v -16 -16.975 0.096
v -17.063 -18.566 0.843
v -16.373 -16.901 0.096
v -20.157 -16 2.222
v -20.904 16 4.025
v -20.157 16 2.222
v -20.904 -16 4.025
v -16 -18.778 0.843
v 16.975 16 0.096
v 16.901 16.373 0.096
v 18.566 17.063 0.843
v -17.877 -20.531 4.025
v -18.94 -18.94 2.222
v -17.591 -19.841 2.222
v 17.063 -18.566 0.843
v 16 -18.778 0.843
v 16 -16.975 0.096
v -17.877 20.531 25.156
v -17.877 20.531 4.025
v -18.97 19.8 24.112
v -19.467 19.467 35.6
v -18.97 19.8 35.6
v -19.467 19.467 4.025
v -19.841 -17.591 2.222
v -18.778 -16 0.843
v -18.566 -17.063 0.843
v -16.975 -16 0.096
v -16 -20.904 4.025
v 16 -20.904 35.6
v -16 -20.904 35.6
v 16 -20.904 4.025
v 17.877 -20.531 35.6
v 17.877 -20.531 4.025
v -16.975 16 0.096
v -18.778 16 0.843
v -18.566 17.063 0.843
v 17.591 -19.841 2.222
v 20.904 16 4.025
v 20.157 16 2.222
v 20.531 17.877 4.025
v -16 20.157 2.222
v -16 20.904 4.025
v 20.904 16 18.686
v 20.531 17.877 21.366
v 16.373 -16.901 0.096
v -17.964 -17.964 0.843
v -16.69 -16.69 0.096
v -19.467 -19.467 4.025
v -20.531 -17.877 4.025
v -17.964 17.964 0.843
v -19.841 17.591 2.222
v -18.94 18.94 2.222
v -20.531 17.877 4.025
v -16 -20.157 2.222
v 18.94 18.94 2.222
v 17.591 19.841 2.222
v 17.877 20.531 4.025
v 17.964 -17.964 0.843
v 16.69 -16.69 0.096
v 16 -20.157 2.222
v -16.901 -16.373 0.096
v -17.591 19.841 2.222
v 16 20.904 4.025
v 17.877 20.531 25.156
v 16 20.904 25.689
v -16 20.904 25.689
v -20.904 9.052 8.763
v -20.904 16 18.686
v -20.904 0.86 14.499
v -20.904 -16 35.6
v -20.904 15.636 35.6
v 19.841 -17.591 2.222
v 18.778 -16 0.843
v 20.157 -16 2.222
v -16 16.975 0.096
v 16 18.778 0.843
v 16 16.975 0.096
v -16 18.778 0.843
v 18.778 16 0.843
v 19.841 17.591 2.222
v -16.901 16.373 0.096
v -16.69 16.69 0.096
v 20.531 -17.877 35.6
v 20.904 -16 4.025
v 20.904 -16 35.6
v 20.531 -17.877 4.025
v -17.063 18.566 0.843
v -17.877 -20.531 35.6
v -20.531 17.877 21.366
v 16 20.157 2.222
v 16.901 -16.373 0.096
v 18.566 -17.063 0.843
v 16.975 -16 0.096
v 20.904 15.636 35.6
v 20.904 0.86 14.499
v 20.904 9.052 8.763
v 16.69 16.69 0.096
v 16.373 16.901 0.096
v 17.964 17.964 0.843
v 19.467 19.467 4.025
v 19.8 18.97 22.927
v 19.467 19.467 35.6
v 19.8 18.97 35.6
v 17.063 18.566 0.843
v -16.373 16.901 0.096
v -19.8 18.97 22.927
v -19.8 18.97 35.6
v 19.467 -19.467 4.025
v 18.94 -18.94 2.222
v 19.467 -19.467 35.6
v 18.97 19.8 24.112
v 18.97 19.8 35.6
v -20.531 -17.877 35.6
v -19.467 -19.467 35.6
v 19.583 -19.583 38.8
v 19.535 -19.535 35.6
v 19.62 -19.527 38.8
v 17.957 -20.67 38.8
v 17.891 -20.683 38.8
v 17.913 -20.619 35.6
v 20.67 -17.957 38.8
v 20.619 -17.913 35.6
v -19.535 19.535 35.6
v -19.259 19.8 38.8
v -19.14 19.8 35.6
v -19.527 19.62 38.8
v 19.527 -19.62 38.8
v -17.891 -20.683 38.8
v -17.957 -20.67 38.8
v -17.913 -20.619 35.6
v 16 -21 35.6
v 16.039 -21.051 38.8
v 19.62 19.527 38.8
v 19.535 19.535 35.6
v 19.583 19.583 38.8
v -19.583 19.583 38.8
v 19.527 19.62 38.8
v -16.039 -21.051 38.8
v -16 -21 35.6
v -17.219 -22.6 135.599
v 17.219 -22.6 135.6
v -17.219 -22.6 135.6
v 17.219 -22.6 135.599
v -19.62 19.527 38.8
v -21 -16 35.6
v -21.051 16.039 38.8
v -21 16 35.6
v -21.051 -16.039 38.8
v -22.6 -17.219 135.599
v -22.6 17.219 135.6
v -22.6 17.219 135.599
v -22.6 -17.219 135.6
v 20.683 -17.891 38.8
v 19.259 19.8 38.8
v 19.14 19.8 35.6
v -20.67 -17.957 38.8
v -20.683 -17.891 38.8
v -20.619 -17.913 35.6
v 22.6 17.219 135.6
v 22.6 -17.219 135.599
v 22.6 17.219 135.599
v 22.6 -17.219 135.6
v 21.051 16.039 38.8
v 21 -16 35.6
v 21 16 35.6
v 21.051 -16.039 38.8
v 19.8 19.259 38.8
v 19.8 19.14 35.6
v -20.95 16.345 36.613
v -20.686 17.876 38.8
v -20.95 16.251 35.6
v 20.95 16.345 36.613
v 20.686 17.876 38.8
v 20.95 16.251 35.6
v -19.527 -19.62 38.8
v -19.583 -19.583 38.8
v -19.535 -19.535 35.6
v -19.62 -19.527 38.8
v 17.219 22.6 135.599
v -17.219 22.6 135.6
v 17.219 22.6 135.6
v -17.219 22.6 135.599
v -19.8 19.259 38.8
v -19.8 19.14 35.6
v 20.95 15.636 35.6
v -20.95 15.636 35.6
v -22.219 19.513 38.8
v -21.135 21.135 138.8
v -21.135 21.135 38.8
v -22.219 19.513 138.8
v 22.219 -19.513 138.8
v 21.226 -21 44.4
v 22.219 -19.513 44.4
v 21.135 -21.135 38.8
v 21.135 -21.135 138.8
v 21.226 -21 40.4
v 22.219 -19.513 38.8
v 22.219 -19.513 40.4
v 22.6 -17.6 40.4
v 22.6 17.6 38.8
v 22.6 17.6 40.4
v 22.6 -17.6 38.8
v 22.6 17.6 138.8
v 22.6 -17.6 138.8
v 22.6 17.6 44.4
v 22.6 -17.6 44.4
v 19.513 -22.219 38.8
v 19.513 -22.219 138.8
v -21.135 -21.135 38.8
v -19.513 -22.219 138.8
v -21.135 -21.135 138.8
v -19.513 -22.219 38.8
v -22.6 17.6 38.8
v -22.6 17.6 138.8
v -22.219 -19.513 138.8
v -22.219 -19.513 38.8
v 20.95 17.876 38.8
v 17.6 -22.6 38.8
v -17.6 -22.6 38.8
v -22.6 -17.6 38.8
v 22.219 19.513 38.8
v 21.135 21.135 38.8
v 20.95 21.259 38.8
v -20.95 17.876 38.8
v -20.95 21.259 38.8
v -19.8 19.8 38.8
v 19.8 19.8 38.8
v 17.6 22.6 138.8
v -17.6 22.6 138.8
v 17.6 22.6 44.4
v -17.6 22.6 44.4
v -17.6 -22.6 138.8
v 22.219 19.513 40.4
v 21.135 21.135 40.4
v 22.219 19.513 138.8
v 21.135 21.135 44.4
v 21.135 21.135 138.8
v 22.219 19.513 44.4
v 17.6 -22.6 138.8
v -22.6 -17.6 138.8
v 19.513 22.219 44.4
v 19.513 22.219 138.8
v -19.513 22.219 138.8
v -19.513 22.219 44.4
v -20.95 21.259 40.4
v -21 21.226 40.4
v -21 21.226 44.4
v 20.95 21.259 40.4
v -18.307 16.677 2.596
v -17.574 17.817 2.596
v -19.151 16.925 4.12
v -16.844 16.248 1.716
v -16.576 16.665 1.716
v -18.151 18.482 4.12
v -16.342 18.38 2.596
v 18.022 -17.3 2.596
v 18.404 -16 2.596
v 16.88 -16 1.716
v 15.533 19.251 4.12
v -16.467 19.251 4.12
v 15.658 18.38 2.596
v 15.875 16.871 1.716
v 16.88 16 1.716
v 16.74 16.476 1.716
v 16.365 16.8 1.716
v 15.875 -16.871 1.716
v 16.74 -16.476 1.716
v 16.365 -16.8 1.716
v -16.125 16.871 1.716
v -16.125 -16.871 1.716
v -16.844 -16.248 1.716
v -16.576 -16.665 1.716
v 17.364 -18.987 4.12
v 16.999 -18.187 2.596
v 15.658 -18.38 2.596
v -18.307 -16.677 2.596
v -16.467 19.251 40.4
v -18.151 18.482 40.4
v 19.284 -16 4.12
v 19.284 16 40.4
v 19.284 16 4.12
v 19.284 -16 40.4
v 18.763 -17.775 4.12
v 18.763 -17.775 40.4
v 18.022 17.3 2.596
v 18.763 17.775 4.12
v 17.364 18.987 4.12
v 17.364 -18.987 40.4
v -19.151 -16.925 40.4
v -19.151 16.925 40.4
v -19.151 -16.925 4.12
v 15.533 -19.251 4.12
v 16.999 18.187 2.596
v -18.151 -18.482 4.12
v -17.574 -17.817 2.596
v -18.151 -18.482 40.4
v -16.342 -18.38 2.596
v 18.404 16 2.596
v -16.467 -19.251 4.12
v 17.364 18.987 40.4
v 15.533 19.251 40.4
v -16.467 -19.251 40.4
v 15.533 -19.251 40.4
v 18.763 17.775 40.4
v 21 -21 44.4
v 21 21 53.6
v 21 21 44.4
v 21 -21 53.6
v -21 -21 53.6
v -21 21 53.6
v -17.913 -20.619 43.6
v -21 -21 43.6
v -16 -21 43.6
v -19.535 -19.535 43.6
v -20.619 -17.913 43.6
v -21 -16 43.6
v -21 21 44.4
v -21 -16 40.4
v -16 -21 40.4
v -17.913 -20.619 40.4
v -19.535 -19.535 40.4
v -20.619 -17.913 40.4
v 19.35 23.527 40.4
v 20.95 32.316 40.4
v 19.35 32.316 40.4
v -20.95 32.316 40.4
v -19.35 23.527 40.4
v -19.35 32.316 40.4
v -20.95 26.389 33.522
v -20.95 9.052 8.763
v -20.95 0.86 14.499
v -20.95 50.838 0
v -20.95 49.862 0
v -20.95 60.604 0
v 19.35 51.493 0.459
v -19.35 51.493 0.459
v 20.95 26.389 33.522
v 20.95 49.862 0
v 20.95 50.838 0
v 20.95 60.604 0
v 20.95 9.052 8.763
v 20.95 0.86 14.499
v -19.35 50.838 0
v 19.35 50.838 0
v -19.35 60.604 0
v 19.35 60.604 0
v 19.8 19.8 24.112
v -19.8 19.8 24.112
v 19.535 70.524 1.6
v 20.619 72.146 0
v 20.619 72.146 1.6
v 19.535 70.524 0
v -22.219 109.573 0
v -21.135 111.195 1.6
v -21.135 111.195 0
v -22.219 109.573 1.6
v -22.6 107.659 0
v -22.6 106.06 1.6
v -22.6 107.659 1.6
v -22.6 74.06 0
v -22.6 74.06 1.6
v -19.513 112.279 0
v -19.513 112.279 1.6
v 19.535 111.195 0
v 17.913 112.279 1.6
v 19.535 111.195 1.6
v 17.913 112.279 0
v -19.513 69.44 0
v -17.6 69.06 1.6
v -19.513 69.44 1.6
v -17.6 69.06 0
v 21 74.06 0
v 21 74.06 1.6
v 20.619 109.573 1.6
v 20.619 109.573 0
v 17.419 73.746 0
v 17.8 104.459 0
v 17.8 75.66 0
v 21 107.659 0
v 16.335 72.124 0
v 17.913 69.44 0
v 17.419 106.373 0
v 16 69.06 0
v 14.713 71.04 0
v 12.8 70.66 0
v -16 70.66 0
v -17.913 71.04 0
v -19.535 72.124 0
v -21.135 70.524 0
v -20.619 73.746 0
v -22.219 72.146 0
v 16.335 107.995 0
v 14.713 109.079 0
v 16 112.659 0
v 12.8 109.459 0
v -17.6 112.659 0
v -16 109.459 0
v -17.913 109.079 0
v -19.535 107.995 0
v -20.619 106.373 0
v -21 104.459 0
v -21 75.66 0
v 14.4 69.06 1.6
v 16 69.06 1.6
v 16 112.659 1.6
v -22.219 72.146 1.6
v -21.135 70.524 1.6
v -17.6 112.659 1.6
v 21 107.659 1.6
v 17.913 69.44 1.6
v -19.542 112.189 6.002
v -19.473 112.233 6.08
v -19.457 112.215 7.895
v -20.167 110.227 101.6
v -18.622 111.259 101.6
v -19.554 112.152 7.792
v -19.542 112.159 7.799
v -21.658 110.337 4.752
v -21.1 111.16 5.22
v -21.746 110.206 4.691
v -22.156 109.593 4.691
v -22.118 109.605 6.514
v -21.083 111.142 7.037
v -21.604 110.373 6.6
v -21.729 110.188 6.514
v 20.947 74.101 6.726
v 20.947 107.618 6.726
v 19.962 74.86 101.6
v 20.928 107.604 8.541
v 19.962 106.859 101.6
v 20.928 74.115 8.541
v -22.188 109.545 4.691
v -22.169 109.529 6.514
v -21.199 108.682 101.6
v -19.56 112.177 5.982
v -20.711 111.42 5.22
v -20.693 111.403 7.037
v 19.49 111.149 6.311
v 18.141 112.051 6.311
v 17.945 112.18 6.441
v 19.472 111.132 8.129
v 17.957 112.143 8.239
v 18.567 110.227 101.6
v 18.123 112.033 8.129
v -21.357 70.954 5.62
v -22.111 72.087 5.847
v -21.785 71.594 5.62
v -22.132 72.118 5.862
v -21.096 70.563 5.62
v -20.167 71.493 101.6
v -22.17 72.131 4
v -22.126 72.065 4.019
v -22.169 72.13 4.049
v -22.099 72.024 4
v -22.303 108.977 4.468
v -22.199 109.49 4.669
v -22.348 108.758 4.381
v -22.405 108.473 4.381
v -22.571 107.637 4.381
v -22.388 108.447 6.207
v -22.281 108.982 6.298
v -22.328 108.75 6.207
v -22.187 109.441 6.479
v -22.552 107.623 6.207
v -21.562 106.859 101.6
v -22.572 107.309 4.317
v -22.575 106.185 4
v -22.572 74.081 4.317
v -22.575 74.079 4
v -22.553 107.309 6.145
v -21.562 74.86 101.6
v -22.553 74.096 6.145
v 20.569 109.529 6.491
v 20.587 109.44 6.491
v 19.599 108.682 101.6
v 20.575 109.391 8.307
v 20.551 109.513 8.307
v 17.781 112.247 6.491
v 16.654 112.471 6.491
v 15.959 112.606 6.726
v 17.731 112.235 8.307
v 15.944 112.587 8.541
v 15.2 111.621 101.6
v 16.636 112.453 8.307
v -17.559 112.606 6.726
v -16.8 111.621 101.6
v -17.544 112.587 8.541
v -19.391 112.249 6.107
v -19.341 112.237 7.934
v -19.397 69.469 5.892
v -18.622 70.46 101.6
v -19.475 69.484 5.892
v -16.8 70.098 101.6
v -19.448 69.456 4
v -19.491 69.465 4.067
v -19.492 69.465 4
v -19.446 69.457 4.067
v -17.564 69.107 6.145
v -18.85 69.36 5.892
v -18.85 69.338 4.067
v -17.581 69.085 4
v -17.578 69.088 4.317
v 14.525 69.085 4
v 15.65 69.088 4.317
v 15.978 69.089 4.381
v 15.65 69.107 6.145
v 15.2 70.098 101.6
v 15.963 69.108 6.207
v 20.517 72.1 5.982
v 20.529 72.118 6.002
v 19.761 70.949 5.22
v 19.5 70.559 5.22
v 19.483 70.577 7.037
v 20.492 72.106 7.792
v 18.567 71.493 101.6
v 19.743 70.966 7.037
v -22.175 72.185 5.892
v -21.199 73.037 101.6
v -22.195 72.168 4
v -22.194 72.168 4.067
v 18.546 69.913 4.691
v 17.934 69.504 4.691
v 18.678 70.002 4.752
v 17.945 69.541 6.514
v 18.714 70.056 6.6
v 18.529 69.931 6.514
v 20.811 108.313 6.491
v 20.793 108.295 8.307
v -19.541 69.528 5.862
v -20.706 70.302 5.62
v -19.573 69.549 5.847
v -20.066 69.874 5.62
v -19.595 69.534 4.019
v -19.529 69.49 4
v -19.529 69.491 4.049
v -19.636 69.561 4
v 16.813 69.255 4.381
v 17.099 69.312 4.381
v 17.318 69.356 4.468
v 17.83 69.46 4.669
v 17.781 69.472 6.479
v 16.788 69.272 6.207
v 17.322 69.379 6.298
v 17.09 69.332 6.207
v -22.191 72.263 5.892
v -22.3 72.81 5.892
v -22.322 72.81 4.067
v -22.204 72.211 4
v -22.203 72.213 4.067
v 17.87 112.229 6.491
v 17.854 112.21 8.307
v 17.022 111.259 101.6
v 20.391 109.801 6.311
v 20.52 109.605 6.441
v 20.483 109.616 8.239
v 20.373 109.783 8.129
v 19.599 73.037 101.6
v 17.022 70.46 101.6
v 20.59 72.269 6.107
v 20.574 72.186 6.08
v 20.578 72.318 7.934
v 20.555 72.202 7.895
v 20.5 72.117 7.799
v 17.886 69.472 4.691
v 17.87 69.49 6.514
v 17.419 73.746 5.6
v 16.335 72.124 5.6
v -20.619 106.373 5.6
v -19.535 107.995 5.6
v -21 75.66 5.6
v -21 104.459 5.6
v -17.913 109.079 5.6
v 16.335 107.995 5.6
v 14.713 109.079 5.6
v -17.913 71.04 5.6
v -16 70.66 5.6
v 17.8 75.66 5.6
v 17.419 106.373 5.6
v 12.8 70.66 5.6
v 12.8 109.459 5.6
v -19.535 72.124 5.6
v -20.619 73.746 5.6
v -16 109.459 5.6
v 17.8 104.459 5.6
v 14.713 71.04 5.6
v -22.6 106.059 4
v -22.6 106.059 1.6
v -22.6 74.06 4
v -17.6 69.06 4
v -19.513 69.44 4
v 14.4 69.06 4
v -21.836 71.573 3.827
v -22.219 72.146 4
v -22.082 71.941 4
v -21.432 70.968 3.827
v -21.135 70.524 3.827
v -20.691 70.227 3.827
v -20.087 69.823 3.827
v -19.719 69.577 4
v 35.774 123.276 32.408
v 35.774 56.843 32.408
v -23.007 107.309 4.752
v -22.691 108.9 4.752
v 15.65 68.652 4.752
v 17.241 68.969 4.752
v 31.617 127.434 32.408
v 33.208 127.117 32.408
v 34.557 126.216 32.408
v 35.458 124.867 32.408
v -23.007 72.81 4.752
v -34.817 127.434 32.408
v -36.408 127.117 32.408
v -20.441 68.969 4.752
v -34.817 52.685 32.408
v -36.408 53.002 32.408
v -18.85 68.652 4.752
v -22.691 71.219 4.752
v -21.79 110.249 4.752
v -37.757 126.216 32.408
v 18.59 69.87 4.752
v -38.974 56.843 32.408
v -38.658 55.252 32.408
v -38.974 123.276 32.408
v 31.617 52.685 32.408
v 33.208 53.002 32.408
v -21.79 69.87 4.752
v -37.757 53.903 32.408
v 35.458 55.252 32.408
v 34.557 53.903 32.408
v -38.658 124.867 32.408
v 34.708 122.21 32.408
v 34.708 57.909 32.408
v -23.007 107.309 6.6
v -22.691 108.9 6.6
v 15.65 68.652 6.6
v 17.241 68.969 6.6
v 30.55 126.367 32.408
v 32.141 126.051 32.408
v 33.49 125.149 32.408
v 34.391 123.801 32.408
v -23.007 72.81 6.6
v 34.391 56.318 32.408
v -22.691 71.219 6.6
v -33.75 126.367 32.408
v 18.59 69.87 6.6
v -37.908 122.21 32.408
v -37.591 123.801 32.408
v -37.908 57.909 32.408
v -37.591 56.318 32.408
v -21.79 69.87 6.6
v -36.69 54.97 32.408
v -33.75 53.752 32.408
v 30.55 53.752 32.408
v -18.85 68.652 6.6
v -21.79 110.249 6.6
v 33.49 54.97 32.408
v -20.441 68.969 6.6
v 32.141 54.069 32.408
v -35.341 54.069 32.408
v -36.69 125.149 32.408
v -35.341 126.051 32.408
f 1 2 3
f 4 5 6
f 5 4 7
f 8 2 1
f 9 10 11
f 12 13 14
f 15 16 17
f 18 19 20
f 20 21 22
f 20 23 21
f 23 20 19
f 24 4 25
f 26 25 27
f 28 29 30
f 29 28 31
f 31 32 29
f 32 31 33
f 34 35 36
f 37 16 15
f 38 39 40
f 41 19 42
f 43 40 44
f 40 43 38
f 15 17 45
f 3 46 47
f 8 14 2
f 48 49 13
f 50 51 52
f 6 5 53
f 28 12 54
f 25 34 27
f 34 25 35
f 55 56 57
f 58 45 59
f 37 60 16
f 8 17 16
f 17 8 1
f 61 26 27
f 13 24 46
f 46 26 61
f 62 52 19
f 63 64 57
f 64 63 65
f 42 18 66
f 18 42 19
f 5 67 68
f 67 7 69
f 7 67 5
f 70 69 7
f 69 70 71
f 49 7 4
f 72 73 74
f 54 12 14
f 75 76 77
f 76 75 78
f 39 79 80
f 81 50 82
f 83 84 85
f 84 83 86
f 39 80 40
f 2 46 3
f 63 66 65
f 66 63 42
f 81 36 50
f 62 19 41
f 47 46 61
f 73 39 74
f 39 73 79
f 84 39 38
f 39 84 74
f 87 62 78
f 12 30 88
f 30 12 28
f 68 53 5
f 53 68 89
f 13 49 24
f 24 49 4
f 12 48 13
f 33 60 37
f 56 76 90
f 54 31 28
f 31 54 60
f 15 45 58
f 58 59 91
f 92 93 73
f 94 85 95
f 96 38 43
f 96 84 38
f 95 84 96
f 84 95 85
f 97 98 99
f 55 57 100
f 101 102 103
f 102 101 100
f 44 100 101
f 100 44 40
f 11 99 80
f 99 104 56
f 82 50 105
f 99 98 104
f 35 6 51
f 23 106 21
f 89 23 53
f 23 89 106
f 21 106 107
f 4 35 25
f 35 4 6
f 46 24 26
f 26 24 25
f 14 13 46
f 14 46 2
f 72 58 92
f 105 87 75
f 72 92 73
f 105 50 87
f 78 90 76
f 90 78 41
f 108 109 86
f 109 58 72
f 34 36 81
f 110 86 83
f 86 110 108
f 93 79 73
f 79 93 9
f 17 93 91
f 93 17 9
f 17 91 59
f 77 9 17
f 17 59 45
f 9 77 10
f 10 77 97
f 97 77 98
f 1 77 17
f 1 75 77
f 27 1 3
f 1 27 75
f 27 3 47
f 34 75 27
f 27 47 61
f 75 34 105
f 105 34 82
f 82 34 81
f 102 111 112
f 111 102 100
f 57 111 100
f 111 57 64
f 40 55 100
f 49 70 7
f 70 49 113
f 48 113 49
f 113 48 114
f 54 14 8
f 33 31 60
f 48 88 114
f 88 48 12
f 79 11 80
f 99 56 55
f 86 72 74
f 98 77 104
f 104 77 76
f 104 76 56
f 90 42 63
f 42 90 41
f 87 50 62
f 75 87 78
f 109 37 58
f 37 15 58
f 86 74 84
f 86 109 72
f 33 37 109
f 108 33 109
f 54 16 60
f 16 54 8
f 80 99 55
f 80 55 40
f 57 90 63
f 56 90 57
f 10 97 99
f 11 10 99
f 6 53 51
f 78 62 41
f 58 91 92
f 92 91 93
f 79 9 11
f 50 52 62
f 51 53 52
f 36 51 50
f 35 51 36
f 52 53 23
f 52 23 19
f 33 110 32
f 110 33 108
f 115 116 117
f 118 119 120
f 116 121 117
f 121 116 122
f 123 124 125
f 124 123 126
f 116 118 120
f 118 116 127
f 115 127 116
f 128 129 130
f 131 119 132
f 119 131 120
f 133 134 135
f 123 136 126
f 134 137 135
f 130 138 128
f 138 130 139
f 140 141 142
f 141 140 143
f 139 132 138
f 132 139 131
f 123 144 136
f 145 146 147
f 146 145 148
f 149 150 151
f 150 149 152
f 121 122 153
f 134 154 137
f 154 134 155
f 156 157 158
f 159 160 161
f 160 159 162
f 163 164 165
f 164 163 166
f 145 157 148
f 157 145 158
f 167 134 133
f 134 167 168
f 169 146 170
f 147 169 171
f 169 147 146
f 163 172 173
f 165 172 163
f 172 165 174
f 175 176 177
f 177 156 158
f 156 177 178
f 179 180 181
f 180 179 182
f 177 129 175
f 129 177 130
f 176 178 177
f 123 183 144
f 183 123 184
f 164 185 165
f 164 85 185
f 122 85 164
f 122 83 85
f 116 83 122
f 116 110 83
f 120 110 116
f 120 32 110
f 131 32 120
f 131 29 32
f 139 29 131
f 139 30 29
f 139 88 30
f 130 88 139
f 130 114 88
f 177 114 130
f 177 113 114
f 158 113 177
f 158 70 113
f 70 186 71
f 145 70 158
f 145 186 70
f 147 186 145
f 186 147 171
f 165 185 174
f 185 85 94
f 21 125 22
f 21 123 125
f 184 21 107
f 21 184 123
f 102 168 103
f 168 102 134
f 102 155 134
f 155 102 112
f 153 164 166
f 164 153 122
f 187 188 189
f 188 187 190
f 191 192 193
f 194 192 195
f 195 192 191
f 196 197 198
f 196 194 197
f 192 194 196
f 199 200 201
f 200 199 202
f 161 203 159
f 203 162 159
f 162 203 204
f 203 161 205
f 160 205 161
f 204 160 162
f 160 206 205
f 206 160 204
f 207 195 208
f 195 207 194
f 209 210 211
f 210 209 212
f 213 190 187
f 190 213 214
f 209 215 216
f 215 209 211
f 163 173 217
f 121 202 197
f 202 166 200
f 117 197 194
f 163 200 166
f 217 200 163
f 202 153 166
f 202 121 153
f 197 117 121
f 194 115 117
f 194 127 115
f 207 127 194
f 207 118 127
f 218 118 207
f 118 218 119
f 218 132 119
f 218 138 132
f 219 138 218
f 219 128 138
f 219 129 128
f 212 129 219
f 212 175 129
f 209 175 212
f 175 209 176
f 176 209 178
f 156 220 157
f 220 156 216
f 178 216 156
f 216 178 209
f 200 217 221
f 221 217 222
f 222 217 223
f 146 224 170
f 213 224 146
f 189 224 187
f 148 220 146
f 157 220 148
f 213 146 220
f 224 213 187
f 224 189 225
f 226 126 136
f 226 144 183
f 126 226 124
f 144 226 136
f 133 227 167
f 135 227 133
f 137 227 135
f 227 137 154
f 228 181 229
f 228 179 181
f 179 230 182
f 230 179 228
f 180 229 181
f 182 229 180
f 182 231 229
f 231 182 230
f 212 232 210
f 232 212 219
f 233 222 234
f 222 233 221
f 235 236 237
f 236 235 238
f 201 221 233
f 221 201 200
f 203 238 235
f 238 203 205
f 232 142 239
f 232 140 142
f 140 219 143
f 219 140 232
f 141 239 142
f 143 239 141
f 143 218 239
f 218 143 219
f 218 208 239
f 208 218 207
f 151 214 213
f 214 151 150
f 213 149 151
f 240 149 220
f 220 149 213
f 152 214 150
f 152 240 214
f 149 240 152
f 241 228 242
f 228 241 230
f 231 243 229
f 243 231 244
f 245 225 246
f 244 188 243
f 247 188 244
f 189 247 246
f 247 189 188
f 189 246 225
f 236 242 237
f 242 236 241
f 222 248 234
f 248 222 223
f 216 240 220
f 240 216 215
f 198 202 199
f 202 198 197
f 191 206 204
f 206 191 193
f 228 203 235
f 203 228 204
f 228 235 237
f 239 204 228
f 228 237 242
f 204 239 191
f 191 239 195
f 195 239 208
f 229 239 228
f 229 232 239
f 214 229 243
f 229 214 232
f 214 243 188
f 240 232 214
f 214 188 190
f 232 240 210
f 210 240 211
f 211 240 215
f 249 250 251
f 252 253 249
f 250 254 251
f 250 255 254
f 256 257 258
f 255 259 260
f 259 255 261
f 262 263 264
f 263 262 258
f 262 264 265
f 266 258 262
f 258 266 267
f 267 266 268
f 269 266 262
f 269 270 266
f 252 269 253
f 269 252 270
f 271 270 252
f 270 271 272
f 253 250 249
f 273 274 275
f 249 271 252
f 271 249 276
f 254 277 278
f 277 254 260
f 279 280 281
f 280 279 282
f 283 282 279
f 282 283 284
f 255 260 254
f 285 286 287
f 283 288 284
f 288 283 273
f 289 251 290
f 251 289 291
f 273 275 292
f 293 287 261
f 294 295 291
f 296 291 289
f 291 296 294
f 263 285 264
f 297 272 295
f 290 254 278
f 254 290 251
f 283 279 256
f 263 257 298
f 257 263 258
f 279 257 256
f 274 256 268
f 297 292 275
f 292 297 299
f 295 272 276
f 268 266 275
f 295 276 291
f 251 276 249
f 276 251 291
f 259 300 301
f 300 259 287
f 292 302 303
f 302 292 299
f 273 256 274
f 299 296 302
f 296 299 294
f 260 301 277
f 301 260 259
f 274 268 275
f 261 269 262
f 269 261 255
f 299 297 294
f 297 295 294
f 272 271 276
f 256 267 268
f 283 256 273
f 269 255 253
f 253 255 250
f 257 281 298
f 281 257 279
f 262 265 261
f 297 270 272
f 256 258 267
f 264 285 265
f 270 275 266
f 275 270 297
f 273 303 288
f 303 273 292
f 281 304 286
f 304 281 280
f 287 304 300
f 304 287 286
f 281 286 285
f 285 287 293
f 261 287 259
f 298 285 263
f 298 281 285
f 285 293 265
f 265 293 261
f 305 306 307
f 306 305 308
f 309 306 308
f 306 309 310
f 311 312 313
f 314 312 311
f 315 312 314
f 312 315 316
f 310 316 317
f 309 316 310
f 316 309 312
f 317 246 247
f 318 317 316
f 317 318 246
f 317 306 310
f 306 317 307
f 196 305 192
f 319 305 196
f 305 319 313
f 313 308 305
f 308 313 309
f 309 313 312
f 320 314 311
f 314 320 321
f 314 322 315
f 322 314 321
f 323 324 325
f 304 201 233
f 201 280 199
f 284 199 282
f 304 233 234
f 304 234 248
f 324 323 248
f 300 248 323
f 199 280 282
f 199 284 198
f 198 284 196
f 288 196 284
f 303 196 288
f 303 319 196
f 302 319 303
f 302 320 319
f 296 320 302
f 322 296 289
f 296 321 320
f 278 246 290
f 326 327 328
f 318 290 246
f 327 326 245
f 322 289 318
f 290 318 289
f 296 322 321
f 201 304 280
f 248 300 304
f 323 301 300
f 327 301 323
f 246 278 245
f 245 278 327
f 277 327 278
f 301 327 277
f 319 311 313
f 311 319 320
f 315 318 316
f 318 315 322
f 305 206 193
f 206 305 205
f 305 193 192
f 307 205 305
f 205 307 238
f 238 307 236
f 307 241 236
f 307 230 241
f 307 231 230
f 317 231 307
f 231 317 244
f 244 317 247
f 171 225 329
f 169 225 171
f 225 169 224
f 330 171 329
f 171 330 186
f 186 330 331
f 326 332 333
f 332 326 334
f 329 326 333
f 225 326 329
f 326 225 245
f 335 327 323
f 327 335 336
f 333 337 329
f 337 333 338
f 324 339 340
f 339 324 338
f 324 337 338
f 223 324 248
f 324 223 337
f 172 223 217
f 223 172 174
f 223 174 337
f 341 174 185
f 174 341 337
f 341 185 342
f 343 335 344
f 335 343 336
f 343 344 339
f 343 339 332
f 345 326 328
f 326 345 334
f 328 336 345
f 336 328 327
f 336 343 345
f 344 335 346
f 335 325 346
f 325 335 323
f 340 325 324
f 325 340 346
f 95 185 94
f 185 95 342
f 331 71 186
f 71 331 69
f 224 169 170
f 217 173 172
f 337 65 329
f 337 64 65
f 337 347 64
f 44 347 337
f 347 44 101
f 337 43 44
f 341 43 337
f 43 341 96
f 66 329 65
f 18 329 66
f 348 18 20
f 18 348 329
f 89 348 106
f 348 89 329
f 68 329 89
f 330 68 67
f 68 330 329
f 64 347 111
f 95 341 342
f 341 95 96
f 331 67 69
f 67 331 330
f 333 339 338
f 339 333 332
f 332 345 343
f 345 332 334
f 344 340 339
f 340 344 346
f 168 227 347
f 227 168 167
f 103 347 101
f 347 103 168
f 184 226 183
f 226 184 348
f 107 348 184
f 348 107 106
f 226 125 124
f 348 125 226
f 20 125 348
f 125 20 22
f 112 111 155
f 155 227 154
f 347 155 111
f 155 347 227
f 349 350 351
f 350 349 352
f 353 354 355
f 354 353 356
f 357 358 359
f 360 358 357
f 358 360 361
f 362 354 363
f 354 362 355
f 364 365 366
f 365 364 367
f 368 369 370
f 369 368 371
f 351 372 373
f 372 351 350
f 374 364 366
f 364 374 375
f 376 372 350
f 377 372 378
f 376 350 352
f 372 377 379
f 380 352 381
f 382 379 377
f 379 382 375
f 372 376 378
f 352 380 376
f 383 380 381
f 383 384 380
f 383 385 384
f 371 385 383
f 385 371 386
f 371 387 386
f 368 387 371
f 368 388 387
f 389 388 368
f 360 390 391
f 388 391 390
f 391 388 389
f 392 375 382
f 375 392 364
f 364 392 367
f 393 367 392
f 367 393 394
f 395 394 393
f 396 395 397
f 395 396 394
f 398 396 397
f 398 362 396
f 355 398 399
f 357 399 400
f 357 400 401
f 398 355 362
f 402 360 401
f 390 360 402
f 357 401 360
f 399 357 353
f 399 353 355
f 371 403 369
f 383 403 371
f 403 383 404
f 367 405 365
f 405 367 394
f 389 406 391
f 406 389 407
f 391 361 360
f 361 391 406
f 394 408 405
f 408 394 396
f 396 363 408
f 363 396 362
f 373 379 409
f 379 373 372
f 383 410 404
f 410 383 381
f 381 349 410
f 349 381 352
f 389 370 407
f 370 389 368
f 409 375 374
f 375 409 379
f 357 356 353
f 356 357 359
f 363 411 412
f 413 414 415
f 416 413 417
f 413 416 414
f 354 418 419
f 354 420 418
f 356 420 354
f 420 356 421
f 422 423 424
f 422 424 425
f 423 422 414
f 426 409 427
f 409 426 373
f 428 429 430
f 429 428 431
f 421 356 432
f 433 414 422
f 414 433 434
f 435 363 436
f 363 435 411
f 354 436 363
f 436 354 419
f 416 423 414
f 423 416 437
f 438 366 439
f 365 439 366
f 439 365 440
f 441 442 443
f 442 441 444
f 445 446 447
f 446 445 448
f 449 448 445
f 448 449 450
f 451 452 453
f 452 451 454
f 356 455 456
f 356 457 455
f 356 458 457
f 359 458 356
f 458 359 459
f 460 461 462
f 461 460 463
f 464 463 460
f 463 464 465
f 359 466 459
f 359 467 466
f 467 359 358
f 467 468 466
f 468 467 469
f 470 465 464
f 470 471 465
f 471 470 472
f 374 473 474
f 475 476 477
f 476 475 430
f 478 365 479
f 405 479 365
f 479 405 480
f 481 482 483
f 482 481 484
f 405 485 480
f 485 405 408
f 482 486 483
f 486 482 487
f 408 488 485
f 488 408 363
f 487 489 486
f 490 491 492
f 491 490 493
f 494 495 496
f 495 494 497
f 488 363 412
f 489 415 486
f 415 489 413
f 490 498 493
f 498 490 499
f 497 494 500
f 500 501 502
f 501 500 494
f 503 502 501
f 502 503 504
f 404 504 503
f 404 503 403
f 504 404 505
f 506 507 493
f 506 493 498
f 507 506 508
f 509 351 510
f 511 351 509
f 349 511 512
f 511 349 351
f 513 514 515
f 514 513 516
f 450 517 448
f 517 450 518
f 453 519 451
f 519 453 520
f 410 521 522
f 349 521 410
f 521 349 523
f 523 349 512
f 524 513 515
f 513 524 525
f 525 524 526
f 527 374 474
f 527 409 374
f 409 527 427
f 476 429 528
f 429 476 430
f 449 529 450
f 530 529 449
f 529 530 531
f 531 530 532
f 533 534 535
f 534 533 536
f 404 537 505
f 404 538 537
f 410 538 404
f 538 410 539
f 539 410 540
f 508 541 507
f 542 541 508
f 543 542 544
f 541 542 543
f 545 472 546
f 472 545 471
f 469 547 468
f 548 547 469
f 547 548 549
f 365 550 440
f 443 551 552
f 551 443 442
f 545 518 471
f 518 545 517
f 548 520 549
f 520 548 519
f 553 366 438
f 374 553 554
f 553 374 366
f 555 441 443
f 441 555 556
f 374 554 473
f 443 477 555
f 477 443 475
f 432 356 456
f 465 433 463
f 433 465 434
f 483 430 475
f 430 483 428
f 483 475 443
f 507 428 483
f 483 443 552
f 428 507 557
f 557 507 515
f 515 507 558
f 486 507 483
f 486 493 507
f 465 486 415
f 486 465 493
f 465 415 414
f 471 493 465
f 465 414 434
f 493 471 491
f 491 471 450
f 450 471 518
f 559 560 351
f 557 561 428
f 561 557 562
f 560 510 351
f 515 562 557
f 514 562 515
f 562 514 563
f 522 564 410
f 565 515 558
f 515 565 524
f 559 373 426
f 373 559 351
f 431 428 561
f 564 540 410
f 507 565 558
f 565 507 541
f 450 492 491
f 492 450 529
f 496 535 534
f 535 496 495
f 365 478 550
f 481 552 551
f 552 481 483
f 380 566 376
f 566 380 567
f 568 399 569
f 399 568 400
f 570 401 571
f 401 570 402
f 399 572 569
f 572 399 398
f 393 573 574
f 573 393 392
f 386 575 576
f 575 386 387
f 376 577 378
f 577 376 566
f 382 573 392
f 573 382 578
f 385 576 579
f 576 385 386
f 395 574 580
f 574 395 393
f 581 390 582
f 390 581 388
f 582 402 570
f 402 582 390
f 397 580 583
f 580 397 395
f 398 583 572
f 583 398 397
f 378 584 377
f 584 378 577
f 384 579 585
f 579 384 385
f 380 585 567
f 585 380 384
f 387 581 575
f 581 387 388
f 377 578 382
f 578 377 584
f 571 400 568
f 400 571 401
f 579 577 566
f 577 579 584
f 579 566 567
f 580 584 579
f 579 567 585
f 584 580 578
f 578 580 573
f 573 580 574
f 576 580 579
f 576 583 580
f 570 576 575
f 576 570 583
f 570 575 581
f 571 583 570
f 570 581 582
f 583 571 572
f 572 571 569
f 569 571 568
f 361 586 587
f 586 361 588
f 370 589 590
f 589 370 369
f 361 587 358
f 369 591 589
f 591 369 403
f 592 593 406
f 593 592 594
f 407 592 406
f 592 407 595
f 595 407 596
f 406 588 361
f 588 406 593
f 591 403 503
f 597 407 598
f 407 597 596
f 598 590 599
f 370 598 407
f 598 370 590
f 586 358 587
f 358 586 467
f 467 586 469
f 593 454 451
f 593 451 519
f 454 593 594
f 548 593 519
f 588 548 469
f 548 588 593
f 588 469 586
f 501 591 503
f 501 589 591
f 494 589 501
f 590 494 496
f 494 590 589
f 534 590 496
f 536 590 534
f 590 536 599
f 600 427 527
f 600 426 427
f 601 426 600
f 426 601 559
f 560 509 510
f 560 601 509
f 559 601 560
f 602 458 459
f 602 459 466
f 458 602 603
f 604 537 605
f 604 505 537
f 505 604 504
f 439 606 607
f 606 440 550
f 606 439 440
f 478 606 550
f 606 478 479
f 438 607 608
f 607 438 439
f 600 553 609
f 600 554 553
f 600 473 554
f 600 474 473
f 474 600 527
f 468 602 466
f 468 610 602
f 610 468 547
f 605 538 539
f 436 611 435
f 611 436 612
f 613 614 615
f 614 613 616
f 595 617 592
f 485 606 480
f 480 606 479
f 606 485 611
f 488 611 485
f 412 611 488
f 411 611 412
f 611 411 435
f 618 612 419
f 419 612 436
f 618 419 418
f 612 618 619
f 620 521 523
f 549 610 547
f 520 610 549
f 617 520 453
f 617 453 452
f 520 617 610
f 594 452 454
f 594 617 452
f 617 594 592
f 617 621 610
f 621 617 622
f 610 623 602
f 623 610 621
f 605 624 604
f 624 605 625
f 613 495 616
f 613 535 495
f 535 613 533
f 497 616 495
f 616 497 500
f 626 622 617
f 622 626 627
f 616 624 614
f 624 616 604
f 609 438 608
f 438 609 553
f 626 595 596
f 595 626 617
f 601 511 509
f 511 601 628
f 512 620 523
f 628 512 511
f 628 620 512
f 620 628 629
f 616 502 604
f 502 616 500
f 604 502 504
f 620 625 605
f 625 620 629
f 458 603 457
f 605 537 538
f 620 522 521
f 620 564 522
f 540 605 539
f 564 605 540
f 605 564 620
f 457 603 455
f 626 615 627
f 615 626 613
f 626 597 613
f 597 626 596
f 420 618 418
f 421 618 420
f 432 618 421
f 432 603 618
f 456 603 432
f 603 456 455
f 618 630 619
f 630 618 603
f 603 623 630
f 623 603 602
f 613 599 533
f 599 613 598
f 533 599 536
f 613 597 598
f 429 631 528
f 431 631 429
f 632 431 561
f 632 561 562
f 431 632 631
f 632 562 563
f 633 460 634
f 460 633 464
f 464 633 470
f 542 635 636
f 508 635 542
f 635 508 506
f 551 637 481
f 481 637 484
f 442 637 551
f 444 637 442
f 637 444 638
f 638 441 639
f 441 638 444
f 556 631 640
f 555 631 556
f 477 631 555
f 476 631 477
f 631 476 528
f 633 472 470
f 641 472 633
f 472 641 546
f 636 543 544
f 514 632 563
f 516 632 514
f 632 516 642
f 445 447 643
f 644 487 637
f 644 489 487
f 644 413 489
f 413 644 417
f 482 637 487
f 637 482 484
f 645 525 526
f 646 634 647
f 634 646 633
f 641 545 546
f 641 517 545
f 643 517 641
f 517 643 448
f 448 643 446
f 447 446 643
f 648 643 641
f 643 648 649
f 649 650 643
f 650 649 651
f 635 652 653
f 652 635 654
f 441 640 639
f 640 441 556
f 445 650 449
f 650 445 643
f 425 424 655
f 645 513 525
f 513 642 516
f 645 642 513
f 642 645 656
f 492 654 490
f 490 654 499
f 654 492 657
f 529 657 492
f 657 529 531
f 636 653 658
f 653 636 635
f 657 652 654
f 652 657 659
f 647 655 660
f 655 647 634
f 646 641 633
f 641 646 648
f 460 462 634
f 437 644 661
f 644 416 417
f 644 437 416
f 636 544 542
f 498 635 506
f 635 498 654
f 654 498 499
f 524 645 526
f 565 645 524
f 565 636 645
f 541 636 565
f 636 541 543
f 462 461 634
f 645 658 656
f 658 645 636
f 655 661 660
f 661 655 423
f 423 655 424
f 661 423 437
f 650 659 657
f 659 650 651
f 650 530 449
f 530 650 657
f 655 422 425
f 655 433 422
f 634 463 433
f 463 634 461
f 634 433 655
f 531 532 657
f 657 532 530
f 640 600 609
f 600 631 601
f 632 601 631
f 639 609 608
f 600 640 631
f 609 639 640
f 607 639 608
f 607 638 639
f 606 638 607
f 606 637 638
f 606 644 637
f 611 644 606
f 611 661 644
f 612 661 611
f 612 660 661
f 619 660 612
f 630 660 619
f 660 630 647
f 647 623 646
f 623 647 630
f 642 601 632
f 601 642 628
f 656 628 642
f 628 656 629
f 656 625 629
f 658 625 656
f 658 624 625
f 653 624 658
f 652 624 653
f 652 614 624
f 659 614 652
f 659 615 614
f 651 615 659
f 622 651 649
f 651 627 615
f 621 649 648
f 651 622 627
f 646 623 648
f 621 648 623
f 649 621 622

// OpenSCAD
// -*- mode: SCAD ; c-file-style: "ellemtel" ; coding: utf-8 -*-
//
// Tea portioner
//
// Copyright 2017 Roland Sieker <ospalh@gmail.com>
// Licence: CC-BY-SA 4.0
// Using material (or inspirations) by
// Soren_Furbo (https://www.thingiverse.com/thing:43899/)
//

// How many cubic centimetres (ml) for one portion
volume = 55;  // [3:0.1:250]

// Don't
use_american_customary_units = 0;  // [1:Yes please. What's a meter?, 0:Of course not! Use SI units.]

module end_customizer()
{
   // This is a dummy module so stop users messing with the values below.
}

// TODO: labels
// TODO 2: Braile labels
// label_style = 1; [0:No label, 1:Raised Text, 2:Colored Text, 3:Braile];


min_funnel_top_width = 66.66667;

// Define values for $fa and $fs (or $fn) to get smoother corners.
// N.B.: Rendering of the funnel gets quite slow for small $fs and $fa values.
// $fa = 5;
// $fs = 0.5;


// This avoids odd edges caused by rounding errors. Use a smaller value
// here when you switched to smoother above.
odd_offset = 0.1;


// Should be a multiple of your nozzle diameter
wall_thickness = 1.6; // [1.2, 1.5, 1.6, 1.8]



// pi is still wrong. Even if we use the area of a circle below. Use tau.
tau = 2 * PI;

// Curvature of sides (Sphere radius)
roundness = 5;
inner_radius = roundness-wall_thickness;

chute_angle = 55;  // Degrees
funnel_angle = 60;

v_cmm = volume * 1000;

// Crazy math to get the volume with the rounding right Basically we
// have V = l^3 - lost_volume, with lost volume = the fillets in the
// edges and corners, 1/2 (cube - sphere), and a bit, depending on l,
// (square rod - cylinder), with no l^2 term.  Transformed to 0 = l^3 +
// al + b, plugged into Wolfram Alpha, put in here.
a = -8*(4-tau/2)*inner_radius*inner_radius;
b = -v_cmm +
      ((4-tau/3) -12 * (4 - tau/2)) * inner_radius*inner_radius*inner_radius;
// echo(a);
// echo(b);
// The solution of x^3+ax+b=0, accordinrg to Wolfram alpha
cube_root_bit = pow(sqrt(3) * sqrt(4*a*a*a + 27*b*b) - 9*b, 1/3);
inner_box_dimension = cube_root_bit / (pow(2, 1/3) * pow(3, 2/3)) -
   pow(2/3, 1/3) * a / cube_root_bit;
// echo(inner_box_dimension);
// echo(pow(v_cmm,1/3));
// Quick tests showed reasonable values, so i'll keep this version
// until somebody spots an error.

// End crazy math.

some_distance = 1.95 * inner_box_dimension + 10 * wall_thickness;


if (use_american_customary_units)
{
   how_rude();
}
else
{
   measure();
   chute();

   translate([0,some_distance,0])
   {
      rotate(180)
      {
         funnel();
      }
   }
}

if (false)
{
   // Demo. Check that the funnel fits
   translate(
      [wall_thickness, wall_thickness, inner_box_dimension + wall_thickness])
   {
      rotate(180)
      {
         funnel();
      }
   }

}

module how_rude()
{
   linear_extrude(hight = 0.5) {
      text(text="Please visit", size=5);
      translate([0,-5,0])
      {
         text(text="metric4us.com", size=5);
      }
   }
}

// Length of the inner cube
icl_xy = inner_box_dimension - 2 * inner_radius;
// Measure shell dimension
icl_z = inner_box_dimension - inner_radius;
msd = inner_box_dimension + 2*wall_thickness;


module measure()
{
   // The precisely shaped box

   icl_z_plus =  icl_z + 2*wall_thickness;
   difference()
   {
      union()
      {
         translate([0,0,icl_z_plus/2+roundness])
         {
            difference()
            {
               union()
               {
                  minkowski()
                  {
                     // This is the outer shell
                     cube([icl_xy, icl_xy, icl_z_plus], center=true);
                     sphere(roundness);
                  }
                  // The thicker walls at the top
                  delta_x = (inner_box_dimension +4*wall_thickness)/
                     (inner_box_dimension + 2*wall_thickness);
                  translate([0,0,icl_z/2-4*wall_thickness])
                  {
                     linear_extrude(hight=2*wall_thickness,scale=delta_x)
                     {
                        offset(r=roundness)
                        {
                           square([icl_xy,icl_xy],center=true);
                        }
                     }
                  }
                  translate([0,0,icl_z/2-2*wall_thickness])
                  {
                     linear_extrude(hight=3*wall_thickness)
                     {
                        offset(r=roundness)
                        {
                           square([icl_xy+2*wall_thickness,icl_xy+2*wall_thickness],center=true);
                        }
                     }
                  }
               }
               minkowski()
               {
                  // This is the main hollow shell
                  cube([icl_xy, icl_xy, icl_z_plus], center=true);
                  sphere(inner_radius);
               }
               // Cut off the top. A big enough cube. important is the
               // lower face hight.
               translate([-msd/2,-msd/2,icl_z_plus/2])
               {
                  cube([msd,msd,2*roundness]);
               }
            }
         }
      } // The measuring cup, with thick walls
      // Cutting out space where to put on the funnel. (No rails, just
      // lay it on top.)
      xyl_extra = 5*wall_thickness;
      xyl = inner_box_dimension+2*wall_thickness-2*roundness;
      translate([xyl_extra/2, xyl_extra/2, wall_thickness+inner_box_dimension])
      {
         linear_extrude(2.5*wall_thickness)
         {
            offset(roundness)
            {
               square([xyl + xyl_extra, xyl + xyl_extra],center=true);
            }
         }
      }
   }


}

module chute()
{
   // The length were done by hand, rather than
   // calculated. looks good, is good enough.
   w = inner_box_dimension + 2*wall_thickness - odd_offset;
   h = inner_box_dimension + wall_thickness;
   l = h / sin(chute_angle);
   p = l * cos(chute_angle);
   o = w/2 + p/2 + wall_thickness;
   difference()
   {
      union()
      {
         rotate([0,0,180])
         {
            translate([0,-o, h/2])
            {
               rotate(a=[chute_angle, 0, 0])
               {
                  cube([w, l, wall_thickness], center=true);
                  translate([w/2-wall_thickness/2,0,2.5*wall_thickness])
                  {
                     cube([wall_thickness, 2*l, 5*wall_thickness], center=true);
                  }
                  translate([-w/2+wall_thickness/2,0,2.5*wall_thickness])
                  {
                     cube([wall_thickness, 2*l, 5*wall_thickness], center=true);
                  }
               }
            }
            // Better connection between chute and measure
            difference()
            {
               translate([0,-w/2,
                          inner_box_dimension - inner_radius + roundness])
               {
                  rotate(a=[-chute_angle, 0, 0])
                  {
                     translate([-w/2, -wall_thickness, -2 * roundness + 1 * wall_thickness])
                     {
                        cube([w, 0.85*h, 2 * roundness]);
                     }
                  }
               }
               translate([0,-o, h/2])
               {
                  rotate(a=[chute_angle, 0, 0])
                  {
                     translate([0, 3*wall_thickness, 5*wall_thickness])
                     {
                        cube([w-odd_offset, l, 10*wall_thickness], center=true);
                     }
                  }
               }
               // I wanted to round the connection off. Too much work
               // to position the cylinder to do it.
               // translate([0,0,0])
               // {
               //    rotate(a=[0,90,0])
               //    {
               //       translate([0,0,-w/2])
               //       {
               //          cylinder(r=inner_radius, h=w);
               //       }
               //    }
               // }
            }
         }
      }
      // Honking big boxes to cut off too large stuff
      translate([0,0,-10*inner_box_dimension])
      {
         cube(20*inner_box_dimension,center=true);
      }
      translate(
         [0,0,10*inner_box_dimension + inner_box_dimension -
          inner_radius +roundness])
      {
         cube(20*inner_box_dimension,center=true);
      }
      cube([inner_box_dimension+wall_thickness/2,inner_box_dimension+wall_thickness/2,3*inner_box_dimension],center=true);
   }
}

module funnel()
{
   // First the base
//   xo = inner_box_dimension+2*wall_thickness-2*roundness-2*slider_tolerance;
   xyo = inner_box_dimension+3*wall_thickness-2*roundness;

//   xm = inner_box_dimension                 -2*roundness-2*slider_tolerance;
   xym = inner_box_dimension+2*wall_thickness-2*roundness;

//   xi = inner_box_dimension-2*wall_thickness-2*roundness-2*slider_tolerance;
   xyi = inner_box_dimension+0*  wall_thickness-2*roundness;
   difference()
    {
       translate([0.5*wall_thickness, 0.5*wall_thickness, 0])
       {
          union()
          {
             linear_extrude(wall_thickness)
             {
                offset(roundness)
                {
                   square([xyo,xyo],center=true);
                }
             }
             // Half of this is hidden in the bit below. This covers some edges
             translate([0,0, wall_thickness])
             {

                linear_extrude(hight=1.5*wall_thickness, scale=xym/xyo)
                {
                   offset(roundness)
                   {
                      square([xyo,xyo],center=true);
                   }
                }
             }
          }
       }
       translate([wall_thickness, wall_thickness, -0.5*wall_thickness])
       {
          linear_extrude(4*wall_thickness)
          {
             offset(roundness)
             {
                square([xyi, xyi],center=true);
             }
          }
       }

    }

   difference()
    {
       translate([wall_thickness, wall_thickness, wall_thickness])
       {
          linear_extrude(1.5*wall_thickness)
          {
             offset(roundness)
             {
                square([xym, xym],center=true);
             }
          }
       }
       translate([wall_thickness, wall_thickness, -0.5*wall_thickness])
       {
          linear_extrude(4*wall_thickness)
          {
             offset(roundness)
             {
                square([xyi, xyi],center=true);
             }
          }
       }
    }
   // funnel_angle is typically 60 degrees, tan(60degrees) == sqrt(3)
   funnel_offset = wall_thickness / sin(funnel_angle);
   funnel_z_offset = roundness * sin(funnel_angle);
//   xf = xm + roundness * cos(funnel_angle);
   xyfb = xym + roundness * cos(funnel_angle);
   xyft = max(xyfb, min_funnel_top_width/2);
   funnel_hight = (xyft - xyfb/2) * tan(funnel_angle);
   translate([wall_thickness, wall_thickness,
              2*wall_thickness + funnel_z_offset])
   {
       difference()
       {
           hull()
           {
               translate([xyfb/2, xyfb/2, 0])
               {
                   sphere(roundness);
               }
               translate([-xyfb/2, xyfb/2, 0])
               {
                   sphere(roundness);
               }
               translate([xyfb/2, -xyfb/2, 0])
               {
                   sphere(roundness);
               }
               translate([-xyfb/2, -xyfb/2, 0])
               {
                   sphere(roundness);
               }
               translate([0,0,funnel_hight])
               {
                   translate([xyft, xyft, 0])
                   {
                       sphere(roundness);
                   }
                   translate([-xyft, xyft, 0])
                   {
                       sphere(roundness);
                   }
                   translate([xyft, -xyft, 0])
                   {
                       sphere(roundness);
                   }
                   translate([-xyft, -xyft, 0])
                   {
                       sphere(roundness);
                   }
               }
           }
           translate([0,0,funnel_offset])
           {
               hull()
               {
                   translate([xyfb/2, xyfb/2, 0])
                   {
                       sphere(roundness);
                   }
                   translate([-xyfb/2, xyfb/2, 0])
                   {
                       sphere(roundness);
                   }
                   translate([xyfb/2, -xyfb/2, 0])
                   {
                       sphere(roundness);
                   }
                   translate([-xyfb/2, -xyfb/2, 0])
                   {
                       sphere(roundness);
                   }
                   translate([0,0,funnel_hight])
                   {
                       translate([xyft, xyft, 0])
                       {
                           sphere(roundness);
                       }
                       translate([-xyft, xyft, 0])
                       {
                           sphere(roundness);
                       }
                       translate([xyft, -xyft, 0])
                       {
                           sphere(roundness);
                       }
                       translate([-xyft, -xyft, 0])
                       {
                           sphere(roundness);
                       }
                   }
               }
           }
           translate([0,0,-2*roundness])
           {
               linear_extrude(4*roundness)
               {
                   offset(roundness)
                   {
                       square([xyi, xyi],center=true);
                   }
               }
           }
           translate([0,0,funnel_hight-roundness])
           {
               linear_extrude(2*roundness)
               {
                   offset(roundness)
                   {
                       square([3*xyfb, 3*xyfb],center=true);
                   }
               }
           }

       }
   }
}
